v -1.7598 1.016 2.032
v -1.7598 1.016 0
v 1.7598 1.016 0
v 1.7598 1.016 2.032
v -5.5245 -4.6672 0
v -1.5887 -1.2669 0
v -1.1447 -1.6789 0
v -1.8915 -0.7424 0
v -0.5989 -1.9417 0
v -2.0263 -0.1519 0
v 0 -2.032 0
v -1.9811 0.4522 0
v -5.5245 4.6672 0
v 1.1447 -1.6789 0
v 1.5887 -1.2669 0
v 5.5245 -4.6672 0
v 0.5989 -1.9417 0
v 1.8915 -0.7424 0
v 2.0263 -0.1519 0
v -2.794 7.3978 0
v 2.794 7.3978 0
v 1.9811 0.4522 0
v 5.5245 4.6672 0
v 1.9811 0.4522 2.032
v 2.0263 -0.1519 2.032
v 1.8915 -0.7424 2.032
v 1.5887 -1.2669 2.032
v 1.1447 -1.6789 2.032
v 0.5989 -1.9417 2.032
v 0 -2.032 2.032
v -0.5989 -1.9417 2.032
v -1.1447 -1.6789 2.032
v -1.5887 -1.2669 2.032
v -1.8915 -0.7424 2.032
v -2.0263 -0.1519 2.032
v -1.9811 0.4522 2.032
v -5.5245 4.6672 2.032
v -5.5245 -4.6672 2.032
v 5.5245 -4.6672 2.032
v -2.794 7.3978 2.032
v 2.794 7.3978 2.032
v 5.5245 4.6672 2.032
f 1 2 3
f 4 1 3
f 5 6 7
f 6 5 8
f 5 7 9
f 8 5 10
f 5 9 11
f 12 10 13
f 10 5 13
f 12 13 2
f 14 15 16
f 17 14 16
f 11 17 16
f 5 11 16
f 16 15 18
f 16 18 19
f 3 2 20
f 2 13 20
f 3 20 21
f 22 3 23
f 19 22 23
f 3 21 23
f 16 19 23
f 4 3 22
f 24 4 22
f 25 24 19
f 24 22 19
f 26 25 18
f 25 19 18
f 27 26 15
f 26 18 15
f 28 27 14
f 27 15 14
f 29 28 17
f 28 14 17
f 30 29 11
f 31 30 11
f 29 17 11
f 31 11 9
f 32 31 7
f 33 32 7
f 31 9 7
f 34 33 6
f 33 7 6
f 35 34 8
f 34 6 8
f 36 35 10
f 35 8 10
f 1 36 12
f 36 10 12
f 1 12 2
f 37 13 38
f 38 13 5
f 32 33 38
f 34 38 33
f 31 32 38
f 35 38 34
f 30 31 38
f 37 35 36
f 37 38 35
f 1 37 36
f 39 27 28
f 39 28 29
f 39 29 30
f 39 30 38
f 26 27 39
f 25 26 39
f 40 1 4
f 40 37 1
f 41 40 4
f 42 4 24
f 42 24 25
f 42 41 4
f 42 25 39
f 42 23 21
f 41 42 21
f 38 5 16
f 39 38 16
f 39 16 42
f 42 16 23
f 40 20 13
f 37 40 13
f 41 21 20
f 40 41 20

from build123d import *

# Parameters (mm, degrees)
BOSS_EXTRUDE1_DEPTH = 2.032


with BuildPart() as part:
    # Sketch1 → Boss-Extrude1 (new body)
    with BuildSketch(Plane.XY):
        Polygon((2.794, 7.39775), (-2.794, 7.39775), (-5.5245, 4.66725), (-5.5245, -4.66725), (5.5245, -4.66725), (5.5245, 4.66725), align=None)
        with BuildLine():
            ThreePointArc((1.75976362, 1.016), (0, -2.032), (-1.75976362, 1.016))
            Line((-1.75976362, 1.016), (1.75976362, 1.016))
        make_face(mode=Mode.SUBTRACT)
    extrude(amount=BOSS_EXTRUDE1_DEPTH)


solid = part.part
